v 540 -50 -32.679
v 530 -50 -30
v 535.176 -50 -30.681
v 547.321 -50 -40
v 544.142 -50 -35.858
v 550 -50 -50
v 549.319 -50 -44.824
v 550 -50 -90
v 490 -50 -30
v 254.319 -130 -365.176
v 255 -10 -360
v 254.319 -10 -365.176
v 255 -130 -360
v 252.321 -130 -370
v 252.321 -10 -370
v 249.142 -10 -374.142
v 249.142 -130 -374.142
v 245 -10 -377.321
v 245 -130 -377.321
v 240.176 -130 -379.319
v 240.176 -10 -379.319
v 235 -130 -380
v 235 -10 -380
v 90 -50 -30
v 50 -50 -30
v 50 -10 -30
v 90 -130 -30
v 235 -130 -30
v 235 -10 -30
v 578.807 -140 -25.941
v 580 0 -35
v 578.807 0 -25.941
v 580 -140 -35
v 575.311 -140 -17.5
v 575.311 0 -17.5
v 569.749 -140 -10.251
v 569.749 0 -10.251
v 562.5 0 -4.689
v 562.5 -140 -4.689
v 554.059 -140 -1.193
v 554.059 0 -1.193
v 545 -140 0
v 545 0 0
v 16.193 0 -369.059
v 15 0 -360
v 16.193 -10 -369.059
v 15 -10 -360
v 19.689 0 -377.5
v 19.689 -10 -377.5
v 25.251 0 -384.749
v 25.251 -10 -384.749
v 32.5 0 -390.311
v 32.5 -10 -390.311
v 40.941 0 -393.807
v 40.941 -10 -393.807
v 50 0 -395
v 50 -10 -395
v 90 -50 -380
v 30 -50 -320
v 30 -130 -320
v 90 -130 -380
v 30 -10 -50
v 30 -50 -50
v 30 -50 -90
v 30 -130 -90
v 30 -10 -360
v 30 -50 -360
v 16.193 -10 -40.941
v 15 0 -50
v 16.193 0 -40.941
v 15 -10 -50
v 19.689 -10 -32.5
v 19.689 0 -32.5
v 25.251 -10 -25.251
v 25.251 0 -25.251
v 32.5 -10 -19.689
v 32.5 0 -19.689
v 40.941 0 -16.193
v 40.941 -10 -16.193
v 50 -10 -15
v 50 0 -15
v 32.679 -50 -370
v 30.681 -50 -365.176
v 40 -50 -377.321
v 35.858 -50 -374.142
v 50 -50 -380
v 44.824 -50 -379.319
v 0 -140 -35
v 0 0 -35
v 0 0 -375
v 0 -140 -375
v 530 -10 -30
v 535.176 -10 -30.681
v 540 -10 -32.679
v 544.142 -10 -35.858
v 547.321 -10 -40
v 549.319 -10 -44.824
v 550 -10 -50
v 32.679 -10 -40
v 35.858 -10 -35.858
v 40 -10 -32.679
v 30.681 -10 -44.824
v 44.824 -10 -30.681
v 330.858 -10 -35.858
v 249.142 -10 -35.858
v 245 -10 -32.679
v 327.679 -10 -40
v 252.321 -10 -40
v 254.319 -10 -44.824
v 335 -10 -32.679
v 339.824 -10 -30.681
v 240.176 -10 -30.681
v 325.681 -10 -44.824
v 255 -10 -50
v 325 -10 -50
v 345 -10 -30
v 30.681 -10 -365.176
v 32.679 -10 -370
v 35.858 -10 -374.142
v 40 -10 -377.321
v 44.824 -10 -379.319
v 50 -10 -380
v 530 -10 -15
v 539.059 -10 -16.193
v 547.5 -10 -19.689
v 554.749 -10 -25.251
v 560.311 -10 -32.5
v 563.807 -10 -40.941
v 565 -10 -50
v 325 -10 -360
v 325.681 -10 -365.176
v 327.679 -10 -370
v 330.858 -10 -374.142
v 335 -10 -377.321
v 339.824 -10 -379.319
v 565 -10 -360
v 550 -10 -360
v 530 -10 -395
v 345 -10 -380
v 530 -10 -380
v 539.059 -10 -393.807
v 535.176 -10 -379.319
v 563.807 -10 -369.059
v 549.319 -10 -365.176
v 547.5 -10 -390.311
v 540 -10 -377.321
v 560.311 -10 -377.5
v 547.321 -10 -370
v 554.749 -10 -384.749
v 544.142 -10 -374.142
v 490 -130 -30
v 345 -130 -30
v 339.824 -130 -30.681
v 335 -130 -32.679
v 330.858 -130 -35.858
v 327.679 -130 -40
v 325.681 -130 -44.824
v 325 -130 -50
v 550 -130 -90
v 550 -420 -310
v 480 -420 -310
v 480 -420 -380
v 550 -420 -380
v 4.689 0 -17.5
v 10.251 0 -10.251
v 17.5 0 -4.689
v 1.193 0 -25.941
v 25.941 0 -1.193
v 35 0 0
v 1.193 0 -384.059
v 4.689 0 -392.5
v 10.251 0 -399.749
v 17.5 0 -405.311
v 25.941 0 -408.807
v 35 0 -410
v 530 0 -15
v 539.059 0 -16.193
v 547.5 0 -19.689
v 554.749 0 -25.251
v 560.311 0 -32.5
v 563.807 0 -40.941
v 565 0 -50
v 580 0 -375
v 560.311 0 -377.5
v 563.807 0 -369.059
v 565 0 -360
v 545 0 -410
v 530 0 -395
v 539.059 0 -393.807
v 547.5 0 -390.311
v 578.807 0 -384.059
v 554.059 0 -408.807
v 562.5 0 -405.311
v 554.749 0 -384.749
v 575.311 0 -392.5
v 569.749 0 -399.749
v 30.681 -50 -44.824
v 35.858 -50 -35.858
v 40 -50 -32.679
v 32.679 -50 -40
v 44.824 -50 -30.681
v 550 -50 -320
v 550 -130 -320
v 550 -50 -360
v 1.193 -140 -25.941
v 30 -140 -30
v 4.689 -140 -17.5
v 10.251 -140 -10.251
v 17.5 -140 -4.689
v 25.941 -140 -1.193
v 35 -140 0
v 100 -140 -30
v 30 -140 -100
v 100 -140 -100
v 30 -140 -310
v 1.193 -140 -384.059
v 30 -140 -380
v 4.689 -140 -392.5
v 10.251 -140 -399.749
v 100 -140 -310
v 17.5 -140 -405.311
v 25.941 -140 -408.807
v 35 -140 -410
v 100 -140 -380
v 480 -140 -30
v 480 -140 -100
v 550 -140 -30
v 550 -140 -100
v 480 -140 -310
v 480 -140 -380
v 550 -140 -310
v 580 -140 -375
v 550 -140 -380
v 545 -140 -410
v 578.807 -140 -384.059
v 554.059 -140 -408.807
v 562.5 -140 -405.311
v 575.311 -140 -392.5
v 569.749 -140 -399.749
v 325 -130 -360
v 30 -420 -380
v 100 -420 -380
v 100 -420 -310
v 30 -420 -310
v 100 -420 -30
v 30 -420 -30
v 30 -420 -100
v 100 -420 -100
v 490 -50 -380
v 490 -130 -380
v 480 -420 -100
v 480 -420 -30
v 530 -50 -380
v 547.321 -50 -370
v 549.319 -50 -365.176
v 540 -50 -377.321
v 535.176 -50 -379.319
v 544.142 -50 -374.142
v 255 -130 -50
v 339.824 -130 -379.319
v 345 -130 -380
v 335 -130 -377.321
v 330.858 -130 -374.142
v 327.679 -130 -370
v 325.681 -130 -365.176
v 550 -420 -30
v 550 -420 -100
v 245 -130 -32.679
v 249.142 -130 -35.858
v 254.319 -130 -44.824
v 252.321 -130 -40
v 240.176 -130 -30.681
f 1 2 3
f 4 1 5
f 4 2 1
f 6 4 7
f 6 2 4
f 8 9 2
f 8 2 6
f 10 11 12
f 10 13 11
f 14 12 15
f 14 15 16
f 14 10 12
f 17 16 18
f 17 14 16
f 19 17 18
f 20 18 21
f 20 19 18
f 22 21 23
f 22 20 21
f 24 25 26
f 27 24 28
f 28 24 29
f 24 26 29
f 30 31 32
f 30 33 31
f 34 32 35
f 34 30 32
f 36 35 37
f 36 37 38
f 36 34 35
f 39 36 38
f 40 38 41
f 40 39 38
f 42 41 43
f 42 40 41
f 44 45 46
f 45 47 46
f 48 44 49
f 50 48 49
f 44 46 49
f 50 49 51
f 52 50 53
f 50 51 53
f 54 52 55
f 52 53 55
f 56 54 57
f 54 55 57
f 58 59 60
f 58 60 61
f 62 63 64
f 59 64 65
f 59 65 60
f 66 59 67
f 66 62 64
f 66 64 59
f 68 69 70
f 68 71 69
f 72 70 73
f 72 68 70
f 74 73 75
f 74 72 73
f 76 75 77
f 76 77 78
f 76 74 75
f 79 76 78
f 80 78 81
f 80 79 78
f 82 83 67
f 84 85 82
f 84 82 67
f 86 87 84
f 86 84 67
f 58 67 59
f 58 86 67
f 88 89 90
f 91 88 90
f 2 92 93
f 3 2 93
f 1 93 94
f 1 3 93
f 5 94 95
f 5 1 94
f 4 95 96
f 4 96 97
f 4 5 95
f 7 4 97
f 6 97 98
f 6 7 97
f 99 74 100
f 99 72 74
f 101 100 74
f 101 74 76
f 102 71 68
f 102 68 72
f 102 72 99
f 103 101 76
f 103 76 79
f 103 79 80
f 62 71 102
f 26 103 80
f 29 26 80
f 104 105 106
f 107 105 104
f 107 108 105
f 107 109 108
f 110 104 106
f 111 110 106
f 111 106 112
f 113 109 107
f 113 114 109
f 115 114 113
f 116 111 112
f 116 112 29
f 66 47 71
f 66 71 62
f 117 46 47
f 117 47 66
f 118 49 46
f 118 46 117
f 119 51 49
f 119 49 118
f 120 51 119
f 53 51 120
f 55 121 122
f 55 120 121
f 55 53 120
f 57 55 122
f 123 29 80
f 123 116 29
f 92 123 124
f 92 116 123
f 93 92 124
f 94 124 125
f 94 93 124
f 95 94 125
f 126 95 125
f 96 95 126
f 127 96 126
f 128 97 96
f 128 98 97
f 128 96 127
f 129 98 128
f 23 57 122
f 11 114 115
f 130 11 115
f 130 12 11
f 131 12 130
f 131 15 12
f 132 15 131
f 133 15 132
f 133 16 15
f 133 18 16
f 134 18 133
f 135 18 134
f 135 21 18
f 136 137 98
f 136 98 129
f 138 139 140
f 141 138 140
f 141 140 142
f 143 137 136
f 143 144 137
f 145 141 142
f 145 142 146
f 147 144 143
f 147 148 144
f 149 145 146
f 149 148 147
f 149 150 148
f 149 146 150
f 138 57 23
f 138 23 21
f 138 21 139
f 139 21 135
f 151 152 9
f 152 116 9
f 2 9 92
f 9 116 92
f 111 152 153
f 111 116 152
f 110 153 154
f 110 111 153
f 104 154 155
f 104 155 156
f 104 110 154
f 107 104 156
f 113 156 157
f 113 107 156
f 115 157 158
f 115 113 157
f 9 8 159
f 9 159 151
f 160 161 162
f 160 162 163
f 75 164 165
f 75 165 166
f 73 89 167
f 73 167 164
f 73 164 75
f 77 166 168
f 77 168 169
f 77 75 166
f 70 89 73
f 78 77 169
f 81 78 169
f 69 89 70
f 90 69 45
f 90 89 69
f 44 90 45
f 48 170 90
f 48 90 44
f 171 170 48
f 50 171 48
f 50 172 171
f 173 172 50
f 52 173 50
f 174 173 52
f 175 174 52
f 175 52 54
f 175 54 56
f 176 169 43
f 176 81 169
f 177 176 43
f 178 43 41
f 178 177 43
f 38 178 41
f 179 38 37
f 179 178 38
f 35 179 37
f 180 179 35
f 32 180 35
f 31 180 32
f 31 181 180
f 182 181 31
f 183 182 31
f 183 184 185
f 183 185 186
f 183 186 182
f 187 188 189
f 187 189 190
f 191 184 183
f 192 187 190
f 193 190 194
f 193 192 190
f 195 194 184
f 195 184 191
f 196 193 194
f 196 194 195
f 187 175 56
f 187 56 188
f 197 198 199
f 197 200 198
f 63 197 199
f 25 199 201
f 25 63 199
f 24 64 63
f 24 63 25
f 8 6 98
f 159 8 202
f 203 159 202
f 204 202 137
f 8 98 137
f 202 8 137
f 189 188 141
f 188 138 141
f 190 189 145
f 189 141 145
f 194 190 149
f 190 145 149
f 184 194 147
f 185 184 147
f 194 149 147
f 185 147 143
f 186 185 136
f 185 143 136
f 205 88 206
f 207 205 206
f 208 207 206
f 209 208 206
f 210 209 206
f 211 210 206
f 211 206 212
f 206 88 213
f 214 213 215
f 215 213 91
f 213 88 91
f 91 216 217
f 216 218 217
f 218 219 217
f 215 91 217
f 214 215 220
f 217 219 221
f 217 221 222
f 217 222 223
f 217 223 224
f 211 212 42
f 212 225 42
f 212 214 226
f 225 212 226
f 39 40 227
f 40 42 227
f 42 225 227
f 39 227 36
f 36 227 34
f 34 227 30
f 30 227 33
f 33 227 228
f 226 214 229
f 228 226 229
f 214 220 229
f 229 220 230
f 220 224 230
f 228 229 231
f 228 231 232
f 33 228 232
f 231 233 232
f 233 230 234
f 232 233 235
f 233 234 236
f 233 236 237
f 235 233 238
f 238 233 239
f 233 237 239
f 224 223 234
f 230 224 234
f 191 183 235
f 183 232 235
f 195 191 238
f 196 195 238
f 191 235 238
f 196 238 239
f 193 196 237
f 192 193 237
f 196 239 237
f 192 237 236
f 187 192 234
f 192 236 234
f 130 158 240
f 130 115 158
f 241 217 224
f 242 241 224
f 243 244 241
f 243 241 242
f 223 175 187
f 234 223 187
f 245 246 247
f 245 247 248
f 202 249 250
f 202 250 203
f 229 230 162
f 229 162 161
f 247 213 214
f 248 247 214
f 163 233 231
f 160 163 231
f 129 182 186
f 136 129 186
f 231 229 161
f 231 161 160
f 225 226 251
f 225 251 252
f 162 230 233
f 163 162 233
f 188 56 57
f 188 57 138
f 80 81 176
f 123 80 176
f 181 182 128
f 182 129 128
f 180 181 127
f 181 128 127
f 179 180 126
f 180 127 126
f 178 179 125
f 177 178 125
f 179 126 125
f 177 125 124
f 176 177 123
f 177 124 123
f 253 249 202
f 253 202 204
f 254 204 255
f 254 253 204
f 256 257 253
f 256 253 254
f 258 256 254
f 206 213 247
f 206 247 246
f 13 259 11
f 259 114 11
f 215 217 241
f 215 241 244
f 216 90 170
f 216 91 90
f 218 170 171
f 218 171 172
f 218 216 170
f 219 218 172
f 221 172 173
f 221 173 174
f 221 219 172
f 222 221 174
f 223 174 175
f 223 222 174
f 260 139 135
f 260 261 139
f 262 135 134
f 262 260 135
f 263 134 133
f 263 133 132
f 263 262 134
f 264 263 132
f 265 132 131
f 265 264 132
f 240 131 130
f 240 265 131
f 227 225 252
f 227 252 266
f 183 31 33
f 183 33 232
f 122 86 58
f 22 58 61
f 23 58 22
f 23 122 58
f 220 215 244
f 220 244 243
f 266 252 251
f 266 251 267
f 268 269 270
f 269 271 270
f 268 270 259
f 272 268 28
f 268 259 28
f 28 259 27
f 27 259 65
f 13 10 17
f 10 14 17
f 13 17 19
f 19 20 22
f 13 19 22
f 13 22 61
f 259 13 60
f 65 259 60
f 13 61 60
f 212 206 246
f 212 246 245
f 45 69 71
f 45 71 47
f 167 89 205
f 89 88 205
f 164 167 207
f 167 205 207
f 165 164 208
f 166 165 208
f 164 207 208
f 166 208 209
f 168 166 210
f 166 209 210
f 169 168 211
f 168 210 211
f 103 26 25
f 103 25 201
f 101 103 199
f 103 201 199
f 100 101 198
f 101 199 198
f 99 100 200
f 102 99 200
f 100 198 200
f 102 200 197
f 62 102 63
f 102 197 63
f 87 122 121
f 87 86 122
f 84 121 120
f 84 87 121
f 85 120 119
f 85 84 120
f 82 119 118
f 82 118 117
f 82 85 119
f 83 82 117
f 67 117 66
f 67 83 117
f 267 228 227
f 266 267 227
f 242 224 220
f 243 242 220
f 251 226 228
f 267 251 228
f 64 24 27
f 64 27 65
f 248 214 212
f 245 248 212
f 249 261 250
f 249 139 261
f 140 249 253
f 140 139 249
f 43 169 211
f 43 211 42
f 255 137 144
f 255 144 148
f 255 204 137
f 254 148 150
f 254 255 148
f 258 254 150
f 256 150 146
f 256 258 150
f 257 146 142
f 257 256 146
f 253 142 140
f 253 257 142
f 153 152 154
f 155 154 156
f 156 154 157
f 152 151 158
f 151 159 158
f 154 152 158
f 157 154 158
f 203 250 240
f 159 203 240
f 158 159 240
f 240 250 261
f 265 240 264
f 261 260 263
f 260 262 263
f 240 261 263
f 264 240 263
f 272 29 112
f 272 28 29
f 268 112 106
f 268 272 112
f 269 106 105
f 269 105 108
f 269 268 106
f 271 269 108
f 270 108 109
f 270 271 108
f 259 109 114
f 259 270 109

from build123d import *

# Parameters (mm, degrees)
SKETCH1_W           = 580
SKETCH1_H           = 410
BOSS_EXTRUDE1_DEPTH = 140
SKETCH3_W           = 550
SKETCH3_H           = 380
CUT_EXTRUDE1_DEPTH  = 10
SKETCH2_W           = 225
SKETCH2_H           = 350
CUT_EXTRUDE2_DEPTH  = 40
CUT_EXTRUDE3_DEPTH  = 80
FILLET1_R           = 35
SKETCH6_W           = 70
SKETCH6_H           = 70
BOSS_EXTRUDE2_DEPTH = 280
FILLET2_R           = 20


with BuildPart() as part:
    # Sketch1 → Boss-Extrude1 (new body)
    with BuildSketch(Plane(origin=(0, 0, 0), x_dir=(1, 0, 0), z_dir=(0, 1, 0))):
        with Locations((290, 205)):
            Rectangle(SKETCH1_W, SKETCH1_H)
    extrude(amount=-BOSS_EXTRUDE1_DEPTH)

    # Sketch3 → Cut-Extrude1 (cut)
    with BuildSketch(Plane(origin=(0, 0, 0), x_dir=(1, 0, 0), z_dir=(0, 1, 0))):
        with Locations((290, 205)):
            Rectangle(SKETCH3_W, SKETCH3_H)
    extrude(amount=-CUT_EXTRUDE1_DEPTH, mode=Mode.SUBTRACT)

    # Sketch2 → Cut-Extrude2 (cut)
    with BuildSketch(Plane(origin=(0, -10, 0), x_dir=(1, 0, 0), z_dir=(0, 1, 0))):
        with Locations((142.5, 205)):
            Rectangle(SKETCH2_W, SKETCH2_H)
        with Locations((437.5, 205)):
            Rectangle(SKETCH2_W, SKETCH2_H)
    extrude(amount=-CUT_EXTRUDE2_DEPTH, mode=Mode.SUBTRACT)

    # Sketch5 → Cut-Extrude3 (cut)
    with BuildSketch(Plane(origin=(0, -50, 0), x_dir=(1, 0, 0), z_dir=(0, 1, 0))):
        Polygon((30, 320), (90, 380), (255, 380), (255, 30), (90, 30), (30, 90), align=None)
        Polygon((550, 90), (490, 30), (325, 30), (325, 380), (490, 380), (550, 320), align=None)
    extrude(amount=-CUT_EXTRUDE3_DEPTH, mode=Mode.SUBTRACT)

    # Fillet1
    fillet1_edges = [part.edges().sort_by_distance(p)[0] for p in [
        (15, -5, -15),
        (15, -5, -395),
        (565, -5, -395),
        (565, -5, -15),
        (0, -70, -410),
        (580, -70, -410),
        (580, -70, 0),
        (0, -70, 0),
    ]]
    fillet(fillet1_edges, radius=FILLET1_R)

    # Sketch6 → Boss-Extrude2 (add)
    with BuildSketch(Plane.XZ.offset(140)):
        with Locations((65, -65)):
            Rectangle(SKETCH6_W, SKETCH6_H)
        with Locations((515, -65)):
            Rectangle(SKETCH6_W, SKETCH6_H)
        with Locations((515, -345)):
            Rectangle(SKETCH6_W, SKETCH6_H)
        with Locations((65, -345)):
            Rectangle(SKETCH6_W, SKETCH6_H)
    extrude(amount=BOSS_EXTRUDE2_DEPTH)

    # Fillet2
    fillet2_edges = [part.edges().sort_by_distance(p)[0] for p in [
        (30, -30, -30),
        (30, -30, -380),
        (255, -70, -380),
        (255, -70, -30),
        (550, -30, -380),
        (550, -30, -30),
        (325, -70, -30),
        (325, -70, -380),
    ]]
    fillet(fillet2_edges, radius=FILLET2_R)


solid = part.part
